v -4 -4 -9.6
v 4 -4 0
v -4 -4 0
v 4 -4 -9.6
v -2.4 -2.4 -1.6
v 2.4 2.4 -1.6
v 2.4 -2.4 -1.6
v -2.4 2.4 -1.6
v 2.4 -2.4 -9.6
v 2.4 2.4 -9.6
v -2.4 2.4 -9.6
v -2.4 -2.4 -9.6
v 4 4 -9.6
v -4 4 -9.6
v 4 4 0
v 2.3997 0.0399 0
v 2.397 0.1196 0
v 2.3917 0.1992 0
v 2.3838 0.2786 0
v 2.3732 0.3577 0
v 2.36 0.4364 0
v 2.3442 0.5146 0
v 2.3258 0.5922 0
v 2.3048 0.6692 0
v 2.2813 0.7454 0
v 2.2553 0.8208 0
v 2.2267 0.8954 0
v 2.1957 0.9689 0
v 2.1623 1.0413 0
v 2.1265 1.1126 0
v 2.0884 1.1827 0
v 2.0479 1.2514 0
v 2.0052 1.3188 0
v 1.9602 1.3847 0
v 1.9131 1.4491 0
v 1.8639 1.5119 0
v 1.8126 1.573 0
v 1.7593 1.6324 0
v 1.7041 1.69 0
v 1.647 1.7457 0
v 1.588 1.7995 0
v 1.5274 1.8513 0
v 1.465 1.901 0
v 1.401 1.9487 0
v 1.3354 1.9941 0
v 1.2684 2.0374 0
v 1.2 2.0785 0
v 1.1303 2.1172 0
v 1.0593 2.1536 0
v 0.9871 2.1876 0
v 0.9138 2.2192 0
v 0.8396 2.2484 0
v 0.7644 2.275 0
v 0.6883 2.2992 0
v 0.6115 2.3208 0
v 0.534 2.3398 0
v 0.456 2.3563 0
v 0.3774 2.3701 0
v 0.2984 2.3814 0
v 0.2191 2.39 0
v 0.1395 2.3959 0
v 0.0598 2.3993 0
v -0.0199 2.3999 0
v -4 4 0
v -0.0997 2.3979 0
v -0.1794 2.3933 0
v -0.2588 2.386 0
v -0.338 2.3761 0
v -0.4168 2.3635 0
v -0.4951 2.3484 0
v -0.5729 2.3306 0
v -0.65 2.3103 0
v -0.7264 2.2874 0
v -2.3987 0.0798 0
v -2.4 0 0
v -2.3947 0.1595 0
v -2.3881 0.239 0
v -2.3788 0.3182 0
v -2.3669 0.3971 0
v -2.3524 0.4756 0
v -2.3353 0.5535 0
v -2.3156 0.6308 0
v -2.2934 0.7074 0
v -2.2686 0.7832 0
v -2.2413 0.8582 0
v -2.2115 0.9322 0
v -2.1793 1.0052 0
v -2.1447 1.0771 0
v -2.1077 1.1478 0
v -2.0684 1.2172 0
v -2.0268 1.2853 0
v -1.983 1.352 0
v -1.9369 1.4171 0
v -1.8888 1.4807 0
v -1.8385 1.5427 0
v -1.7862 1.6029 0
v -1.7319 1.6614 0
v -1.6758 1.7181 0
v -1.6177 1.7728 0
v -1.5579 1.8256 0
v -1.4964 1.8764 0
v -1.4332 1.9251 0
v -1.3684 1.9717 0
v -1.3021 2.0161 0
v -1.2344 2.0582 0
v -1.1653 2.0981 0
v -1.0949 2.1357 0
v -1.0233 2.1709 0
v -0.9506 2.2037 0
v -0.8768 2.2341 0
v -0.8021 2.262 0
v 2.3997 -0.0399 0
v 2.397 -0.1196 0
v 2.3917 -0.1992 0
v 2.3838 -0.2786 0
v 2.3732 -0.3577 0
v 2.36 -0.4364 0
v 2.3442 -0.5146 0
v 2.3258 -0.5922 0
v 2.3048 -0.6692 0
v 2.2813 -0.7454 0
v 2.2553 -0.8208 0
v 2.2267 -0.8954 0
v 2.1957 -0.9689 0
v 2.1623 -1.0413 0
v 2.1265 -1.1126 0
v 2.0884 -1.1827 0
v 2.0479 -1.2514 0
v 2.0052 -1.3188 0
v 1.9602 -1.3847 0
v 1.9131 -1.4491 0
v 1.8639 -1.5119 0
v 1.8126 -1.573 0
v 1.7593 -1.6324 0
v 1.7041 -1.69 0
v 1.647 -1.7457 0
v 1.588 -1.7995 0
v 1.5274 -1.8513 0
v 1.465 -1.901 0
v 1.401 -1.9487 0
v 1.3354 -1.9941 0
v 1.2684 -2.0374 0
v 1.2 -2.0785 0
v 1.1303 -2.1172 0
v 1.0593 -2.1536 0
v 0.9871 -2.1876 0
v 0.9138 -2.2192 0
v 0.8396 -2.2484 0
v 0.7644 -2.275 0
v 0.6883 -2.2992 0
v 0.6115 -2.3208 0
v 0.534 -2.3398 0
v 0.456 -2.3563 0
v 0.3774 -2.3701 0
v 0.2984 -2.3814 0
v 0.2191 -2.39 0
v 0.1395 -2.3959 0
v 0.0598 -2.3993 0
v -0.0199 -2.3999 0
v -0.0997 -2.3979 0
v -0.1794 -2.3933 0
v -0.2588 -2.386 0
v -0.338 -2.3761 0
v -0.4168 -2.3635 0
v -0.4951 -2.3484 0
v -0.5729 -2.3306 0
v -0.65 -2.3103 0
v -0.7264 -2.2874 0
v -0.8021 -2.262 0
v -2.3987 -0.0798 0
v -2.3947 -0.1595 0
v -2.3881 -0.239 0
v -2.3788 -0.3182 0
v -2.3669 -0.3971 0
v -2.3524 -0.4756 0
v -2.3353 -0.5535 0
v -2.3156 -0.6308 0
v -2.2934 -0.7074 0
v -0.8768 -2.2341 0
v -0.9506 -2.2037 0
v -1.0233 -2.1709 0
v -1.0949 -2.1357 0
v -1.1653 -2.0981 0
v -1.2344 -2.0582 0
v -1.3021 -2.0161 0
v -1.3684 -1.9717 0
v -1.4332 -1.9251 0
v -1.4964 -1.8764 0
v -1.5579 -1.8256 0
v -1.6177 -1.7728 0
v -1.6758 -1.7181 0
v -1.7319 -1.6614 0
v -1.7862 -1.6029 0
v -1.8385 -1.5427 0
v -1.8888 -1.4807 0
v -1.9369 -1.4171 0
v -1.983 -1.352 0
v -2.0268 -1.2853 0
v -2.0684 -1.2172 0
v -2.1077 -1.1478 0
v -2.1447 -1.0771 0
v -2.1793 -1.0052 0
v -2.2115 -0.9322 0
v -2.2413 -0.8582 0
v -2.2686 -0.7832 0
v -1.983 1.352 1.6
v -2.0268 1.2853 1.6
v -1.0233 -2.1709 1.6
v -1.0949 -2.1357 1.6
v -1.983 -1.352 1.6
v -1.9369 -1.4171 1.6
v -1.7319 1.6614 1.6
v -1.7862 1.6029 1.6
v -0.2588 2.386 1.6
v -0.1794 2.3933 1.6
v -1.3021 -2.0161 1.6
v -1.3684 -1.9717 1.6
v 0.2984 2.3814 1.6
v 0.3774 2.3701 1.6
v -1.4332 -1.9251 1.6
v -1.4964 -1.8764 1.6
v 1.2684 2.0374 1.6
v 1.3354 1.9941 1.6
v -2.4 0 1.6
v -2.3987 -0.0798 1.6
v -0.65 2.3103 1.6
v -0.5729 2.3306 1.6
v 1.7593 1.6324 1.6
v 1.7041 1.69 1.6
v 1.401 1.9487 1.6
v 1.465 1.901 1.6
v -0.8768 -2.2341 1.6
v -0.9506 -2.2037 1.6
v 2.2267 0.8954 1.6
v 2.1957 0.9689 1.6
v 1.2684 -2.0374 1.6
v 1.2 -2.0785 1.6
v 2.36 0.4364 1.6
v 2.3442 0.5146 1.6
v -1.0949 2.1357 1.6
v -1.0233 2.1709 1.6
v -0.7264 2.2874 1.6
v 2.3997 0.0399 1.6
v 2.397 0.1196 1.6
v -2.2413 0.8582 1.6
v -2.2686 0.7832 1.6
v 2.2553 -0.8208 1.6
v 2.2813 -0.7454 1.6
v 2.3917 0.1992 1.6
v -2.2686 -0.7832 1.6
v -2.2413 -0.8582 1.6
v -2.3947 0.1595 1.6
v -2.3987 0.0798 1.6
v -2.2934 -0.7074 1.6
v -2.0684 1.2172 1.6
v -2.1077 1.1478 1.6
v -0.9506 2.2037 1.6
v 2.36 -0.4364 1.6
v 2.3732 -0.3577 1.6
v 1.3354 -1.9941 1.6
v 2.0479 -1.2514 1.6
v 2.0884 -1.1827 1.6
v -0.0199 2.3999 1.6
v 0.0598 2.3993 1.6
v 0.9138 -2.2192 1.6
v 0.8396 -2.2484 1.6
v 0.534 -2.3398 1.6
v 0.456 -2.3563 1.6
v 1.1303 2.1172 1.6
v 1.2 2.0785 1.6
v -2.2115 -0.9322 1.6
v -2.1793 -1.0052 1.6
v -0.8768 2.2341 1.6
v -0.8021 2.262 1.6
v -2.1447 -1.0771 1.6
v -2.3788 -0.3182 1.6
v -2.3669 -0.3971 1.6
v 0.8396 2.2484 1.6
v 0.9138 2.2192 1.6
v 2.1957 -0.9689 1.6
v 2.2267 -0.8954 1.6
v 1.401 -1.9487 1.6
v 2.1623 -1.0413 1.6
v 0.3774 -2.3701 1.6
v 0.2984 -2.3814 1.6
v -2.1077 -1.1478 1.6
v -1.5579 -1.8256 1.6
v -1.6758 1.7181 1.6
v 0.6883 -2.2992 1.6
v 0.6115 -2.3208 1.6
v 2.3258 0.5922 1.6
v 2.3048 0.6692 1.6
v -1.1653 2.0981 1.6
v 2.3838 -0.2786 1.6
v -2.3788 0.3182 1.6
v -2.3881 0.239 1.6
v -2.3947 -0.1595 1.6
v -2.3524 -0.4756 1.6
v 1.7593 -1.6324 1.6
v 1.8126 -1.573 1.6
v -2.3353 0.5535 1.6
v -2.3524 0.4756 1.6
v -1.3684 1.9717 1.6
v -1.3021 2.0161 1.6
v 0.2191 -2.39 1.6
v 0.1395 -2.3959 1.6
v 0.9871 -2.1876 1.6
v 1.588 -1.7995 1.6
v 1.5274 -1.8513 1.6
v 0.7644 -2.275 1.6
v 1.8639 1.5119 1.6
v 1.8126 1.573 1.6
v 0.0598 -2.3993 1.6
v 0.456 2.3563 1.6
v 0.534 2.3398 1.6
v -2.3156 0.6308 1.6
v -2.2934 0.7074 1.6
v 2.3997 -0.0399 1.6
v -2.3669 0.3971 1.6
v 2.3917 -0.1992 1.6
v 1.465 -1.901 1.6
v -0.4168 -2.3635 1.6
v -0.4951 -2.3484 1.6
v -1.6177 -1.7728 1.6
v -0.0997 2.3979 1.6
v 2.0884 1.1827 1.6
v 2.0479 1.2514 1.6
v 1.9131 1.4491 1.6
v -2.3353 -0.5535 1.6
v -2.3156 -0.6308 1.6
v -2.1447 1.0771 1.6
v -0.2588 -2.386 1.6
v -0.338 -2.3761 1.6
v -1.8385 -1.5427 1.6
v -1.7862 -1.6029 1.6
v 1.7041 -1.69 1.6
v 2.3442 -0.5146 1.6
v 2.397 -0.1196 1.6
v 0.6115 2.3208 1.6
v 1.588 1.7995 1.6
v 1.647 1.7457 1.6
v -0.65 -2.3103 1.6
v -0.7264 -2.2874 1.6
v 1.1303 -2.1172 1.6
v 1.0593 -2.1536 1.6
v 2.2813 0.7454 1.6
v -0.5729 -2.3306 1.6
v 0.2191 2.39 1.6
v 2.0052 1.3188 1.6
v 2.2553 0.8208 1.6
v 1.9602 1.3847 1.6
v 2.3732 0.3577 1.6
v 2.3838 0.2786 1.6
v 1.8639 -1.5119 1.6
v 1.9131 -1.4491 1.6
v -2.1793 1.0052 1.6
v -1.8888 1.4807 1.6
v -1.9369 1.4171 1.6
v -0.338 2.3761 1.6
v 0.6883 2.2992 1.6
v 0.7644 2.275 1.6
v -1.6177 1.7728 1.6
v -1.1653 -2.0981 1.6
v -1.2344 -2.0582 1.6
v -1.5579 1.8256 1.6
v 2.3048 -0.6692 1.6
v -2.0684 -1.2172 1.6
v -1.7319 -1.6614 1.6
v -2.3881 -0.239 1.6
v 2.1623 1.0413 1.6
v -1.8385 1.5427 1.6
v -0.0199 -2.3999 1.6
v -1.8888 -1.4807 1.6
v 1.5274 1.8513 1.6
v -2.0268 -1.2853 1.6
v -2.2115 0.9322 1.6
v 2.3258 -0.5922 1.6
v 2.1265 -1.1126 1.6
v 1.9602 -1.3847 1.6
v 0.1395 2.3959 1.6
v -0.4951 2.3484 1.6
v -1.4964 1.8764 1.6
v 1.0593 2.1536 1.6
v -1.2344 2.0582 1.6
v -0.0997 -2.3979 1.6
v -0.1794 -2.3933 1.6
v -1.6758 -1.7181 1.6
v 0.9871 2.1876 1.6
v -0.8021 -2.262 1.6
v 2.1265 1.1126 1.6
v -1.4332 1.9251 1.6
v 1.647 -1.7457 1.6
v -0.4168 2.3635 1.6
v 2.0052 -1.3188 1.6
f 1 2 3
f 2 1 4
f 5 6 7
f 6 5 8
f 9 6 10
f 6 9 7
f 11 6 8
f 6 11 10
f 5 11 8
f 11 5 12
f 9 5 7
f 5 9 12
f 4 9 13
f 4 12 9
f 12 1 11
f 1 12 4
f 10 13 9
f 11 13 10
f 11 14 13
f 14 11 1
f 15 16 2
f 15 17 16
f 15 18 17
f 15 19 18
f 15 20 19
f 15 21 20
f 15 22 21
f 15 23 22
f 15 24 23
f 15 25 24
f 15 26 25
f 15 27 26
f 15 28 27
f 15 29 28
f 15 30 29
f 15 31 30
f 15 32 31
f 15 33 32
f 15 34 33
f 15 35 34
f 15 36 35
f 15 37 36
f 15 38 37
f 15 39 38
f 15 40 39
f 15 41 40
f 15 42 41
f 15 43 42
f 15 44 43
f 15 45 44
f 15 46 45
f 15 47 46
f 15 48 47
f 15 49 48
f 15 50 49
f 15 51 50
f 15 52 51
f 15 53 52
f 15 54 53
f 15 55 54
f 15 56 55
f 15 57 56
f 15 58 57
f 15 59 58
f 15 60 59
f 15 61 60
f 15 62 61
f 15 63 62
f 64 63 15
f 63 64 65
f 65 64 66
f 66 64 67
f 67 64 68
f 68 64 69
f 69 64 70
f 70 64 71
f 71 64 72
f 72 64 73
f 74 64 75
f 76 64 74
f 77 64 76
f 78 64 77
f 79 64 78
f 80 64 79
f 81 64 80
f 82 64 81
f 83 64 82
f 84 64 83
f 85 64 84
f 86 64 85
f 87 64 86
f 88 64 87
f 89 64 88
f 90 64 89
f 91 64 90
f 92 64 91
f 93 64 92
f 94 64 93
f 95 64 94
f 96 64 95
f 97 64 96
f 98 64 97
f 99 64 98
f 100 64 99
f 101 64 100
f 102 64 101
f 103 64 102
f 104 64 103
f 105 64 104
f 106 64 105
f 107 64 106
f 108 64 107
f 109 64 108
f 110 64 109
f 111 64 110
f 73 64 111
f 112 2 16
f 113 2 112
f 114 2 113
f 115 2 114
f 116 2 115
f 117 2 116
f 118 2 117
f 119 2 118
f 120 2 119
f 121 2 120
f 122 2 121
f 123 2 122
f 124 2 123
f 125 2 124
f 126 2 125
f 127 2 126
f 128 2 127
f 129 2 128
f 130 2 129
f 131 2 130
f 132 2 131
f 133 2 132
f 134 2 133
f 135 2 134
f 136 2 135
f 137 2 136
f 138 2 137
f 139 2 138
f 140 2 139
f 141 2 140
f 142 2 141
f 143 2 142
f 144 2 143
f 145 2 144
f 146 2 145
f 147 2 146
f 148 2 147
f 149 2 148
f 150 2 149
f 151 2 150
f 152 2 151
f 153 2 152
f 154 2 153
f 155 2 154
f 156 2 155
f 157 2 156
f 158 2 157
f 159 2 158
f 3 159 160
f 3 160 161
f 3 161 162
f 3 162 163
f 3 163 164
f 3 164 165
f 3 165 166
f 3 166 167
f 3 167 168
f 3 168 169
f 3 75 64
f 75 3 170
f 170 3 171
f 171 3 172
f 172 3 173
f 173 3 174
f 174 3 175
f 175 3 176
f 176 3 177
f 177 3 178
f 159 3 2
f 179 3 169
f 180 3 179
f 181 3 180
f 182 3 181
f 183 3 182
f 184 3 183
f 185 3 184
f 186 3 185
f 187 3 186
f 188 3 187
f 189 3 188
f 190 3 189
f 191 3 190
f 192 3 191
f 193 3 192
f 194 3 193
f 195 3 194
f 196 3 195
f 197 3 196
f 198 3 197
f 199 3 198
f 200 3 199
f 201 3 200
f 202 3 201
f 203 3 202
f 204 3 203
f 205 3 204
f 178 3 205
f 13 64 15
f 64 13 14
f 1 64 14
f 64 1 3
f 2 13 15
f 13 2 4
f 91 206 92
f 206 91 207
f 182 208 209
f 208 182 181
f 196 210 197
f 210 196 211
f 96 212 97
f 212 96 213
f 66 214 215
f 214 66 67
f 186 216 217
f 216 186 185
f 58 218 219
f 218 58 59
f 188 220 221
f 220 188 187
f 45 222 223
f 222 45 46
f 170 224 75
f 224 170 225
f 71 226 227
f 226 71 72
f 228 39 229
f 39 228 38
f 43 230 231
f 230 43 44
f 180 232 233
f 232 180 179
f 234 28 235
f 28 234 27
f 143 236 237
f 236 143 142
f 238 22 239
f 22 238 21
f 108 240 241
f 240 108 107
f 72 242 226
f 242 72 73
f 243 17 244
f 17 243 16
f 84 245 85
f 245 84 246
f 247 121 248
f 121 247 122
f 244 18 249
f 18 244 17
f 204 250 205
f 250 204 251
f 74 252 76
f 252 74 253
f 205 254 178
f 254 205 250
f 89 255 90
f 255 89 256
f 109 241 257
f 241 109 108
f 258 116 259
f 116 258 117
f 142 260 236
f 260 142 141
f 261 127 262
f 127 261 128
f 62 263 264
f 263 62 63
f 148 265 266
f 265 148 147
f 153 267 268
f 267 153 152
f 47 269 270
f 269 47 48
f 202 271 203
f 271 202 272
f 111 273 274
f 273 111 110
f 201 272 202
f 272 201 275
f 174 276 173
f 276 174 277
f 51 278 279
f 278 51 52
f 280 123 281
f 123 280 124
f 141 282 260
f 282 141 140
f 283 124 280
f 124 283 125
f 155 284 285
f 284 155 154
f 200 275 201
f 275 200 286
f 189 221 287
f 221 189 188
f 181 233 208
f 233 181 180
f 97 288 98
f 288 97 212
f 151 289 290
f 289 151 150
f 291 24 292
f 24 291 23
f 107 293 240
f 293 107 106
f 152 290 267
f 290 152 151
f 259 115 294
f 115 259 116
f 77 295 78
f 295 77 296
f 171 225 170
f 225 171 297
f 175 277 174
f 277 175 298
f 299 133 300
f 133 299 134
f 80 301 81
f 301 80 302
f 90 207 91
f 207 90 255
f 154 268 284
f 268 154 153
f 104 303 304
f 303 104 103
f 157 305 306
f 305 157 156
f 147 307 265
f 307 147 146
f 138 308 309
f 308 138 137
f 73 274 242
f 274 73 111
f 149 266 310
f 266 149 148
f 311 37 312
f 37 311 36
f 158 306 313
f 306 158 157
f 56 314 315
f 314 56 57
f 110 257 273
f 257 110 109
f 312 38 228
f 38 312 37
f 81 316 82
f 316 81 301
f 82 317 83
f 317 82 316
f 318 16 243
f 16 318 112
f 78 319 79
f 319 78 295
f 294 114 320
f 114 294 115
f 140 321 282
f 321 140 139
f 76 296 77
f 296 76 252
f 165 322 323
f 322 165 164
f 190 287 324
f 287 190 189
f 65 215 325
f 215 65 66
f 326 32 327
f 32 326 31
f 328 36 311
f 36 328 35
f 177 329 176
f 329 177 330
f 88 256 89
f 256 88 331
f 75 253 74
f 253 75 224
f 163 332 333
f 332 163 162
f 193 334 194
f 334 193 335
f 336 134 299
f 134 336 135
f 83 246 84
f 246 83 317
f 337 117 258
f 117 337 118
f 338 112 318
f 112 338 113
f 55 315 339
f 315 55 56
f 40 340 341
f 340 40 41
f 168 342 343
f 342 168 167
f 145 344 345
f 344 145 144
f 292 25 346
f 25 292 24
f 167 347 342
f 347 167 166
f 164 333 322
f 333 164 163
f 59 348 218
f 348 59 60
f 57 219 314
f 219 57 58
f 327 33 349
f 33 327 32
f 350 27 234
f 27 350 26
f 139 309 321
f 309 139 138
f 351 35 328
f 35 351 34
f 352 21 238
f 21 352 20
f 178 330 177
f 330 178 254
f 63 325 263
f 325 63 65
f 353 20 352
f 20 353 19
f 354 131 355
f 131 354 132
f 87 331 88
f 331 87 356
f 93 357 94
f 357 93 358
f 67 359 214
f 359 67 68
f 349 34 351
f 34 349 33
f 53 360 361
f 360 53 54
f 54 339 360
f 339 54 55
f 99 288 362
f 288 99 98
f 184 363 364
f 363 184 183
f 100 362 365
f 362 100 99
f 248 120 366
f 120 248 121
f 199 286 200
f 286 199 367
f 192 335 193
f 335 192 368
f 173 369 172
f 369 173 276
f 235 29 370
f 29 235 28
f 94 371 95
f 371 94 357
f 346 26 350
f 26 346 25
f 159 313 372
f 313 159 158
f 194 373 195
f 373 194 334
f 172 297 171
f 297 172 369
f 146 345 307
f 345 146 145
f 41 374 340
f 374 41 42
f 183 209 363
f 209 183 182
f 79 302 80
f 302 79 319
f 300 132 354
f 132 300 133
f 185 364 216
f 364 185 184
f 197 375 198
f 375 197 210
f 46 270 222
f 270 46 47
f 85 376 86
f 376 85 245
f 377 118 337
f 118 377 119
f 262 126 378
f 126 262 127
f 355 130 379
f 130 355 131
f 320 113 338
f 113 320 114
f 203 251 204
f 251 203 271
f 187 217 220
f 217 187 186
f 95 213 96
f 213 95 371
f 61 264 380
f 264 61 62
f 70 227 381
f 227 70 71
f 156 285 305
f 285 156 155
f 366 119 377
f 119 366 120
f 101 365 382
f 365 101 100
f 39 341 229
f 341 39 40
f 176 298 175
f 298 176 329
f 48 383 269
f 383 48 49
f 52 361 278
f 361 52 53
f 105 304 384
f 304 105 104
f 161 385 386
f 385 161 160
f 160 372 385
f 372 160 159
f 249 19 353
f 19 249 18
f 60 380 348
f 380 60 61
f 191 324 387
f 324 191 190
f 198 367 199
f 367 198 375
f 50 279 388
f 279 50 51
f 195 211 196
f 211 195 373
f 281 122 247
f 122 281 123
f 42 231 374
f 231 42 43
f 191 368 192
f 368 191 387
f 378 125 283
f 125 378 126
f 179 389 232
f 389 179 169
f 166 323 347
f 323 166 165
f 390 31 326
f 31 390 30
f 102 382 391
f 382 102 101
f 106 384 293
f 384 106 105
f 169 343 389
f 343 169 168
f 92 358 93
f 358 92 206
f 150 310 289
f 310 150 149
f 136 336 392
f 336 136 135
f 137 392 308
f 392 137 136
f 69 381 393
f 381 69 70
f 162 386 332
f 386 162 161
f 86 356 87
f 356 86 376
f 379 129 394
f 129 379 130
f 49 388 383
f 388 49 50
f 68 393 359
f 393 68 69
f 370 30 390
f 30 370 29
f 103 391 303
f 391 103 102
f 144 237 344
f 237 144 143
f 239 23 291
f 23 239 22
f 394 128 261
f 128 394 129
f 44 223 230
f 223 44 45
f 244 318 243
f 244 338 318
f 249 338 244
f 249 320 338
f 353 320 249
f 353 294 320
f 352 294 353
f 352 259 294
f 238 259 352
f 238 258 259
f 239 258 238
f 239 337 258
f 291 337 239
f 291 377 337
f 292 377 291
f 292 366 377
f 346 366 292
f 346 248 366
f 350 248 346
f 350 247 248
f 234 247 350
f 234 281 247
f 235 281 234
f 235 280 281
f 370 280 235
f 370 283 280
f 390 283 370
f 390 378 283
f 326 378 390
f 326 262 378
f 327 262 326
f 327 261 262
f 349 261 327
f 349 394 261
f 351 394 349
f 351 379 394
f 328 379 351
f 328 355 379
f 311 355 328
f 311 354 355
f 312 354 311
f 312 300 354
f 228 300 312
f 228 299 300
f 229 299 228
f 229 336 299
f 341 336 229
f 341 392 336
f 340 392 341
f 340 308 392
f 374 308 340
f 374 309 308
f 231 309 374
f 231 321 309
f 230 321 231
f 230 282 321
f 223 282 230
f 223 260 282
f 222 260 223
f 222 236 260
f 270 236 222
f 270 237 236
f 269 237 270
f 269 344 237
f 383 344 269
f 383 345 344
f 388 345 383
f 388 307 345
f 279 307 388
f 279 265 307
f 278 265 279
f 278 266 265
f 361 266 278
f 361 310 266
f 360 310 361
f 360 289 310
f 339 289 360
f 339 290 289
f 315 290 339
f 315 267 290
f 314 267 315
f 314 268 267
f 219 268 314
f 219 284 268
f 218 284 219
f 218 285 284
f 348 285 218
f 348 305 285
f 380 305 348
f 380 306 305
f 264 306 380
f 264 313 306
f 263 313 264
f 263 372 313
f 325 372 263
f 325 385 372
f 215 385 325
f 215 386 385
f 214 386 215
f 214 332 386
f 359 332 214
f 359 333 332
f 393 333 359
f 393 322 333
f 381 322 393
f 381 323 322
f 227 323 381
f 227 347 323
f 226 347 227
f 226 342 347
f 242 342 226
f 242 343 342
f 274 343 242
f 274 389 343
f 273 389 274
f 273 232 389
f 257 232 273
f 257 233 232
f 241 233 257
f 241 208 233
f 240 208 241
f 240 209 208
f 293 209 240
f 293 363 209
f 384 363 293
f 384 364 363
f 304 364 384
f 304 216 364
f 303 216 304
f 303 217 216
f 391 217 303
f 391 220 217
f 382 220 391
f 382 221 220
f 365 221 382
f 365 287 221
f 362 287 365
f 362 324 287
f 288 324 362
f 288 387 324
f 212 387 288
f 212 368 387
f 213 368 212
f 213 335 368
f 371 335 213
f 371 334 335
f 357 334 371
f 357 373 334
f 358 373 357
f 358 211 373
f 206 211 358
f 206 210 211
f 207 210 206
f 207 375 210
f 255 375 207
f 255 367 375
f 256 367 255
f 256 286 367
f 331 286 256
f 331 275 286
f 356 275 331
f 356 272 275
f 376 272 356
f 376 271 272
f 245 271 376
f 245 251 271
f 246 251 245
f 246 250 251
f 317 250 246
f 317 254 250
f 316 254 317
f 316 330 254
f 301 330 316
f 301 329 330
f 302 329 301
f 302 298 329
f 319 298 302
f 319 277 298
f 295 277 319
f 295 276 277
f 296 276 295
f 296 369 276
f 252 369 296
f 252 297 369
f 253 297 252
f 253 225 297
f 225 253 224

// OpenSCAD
// file: ../p/4-4edge.scad
use <../lib.scad>
$fa=1; $fs=0.2;
function ldraw_lib__4_4edge(realsolid=false) = [
// 0 Circle 1.0
// 0 Name: 4-4edge.dat
// 0 Author: James Jessiman
// 0 !LDRAW_ORG Primitive UPDATE 2017-01
// 0 !LICENSE Licensed under CC BY 2.0 and CC BY 4.0 : see CAreadme.txt
// 
// 0 BFC CERTIFY CCW
  [0,"BFC","CERTIFY"],
  [0,"BFC","CCW"],
// 
// 0 !HISTORY 1998-12-15 [PTadmin] Official Update 1998-10
// 0 !HISTORY 2005-12-28 [PTadmin] Official Update 2005-01
// 0 !HISTORY 2007-06-24 [PTadmin] Header formatted for Contributor Agreement
// 0 !HISTORY 2008-07-01 [PTadmin] Official Update 2008-01
// 0 !HISTORY 2017-01-15 [Steffen] BFCed
// 0 !HISTORY 2017-12-30 [PTadmin] Official Update 2017-01
// 
// 
// 2 24 1 0 0 0.9239 0 0.3827
  [2,24,1,0,0,0.9239,0,0.3827],
// 2 24 0.9239 0 0.3827 0.7071 0 0.7071
  [2,24,0.9239,0,0.3827,0.7071,0,0.7071],
// 2 24 0.7071 0 0.7071 0.3827 0 0.9239
  [2,24,0.7071,0,0.7071,0.3827,0,0.9239],
// 2 24 0.3827 0 0.9239 0 0 1
  [2,24,0.3827,0,0.9239,0,0,1],
// 2 24 0 0 1 -0.3827 0 0.9239
  [2,24,0,0,1,-0.3827,0,0.9239],
// 2 24 -0.3827 0 0.9239 -0.7071 0 0.7071
  [2,24,-0.3827,0,0.9239,-0.7071,0,0.7071],
// 2 24 -0.7071 0 0.7071 -0.9239 0 0.3827
  [2,24,-0.7071,0,0.7071,-0.9239,0,0.3827],
// 2 24 -0.9239 0 0.3827 -1 0 -0
  [2,24,-0.9239,0,0.3827,-1,0,-0],
// 2 24 -1 0 -0 -0.9239 0 -0.3827
  [2,24,-1,0,-0,-0.9239,0,-0.3827],
// 2 24 -0.9239 0 -0.3827 -0.7071 0 -0.7071
  [2,24,-0.9239,0,-0.3827,-0.7071,0,-0.7071],
// 2 24 -0.7071 0 -0.7071 -0.3827 0 -0.9239
  [2,24,-0.7071,0,-0.7071,-0.3827,0,-0.9239],
// 2 24 -0.3827 0 -0.9239 0 0 -1
  [2,24,-0.3827,0,-0.9239,0,0,-1],
// 2 24 0 0 -1 0.3827 0 -0.9239
  [2,24,0,0,-1,0.3827,0,-0.9239],
// 2 24 0.3827 0 -0.9239 0.7071 0 -0.7071
  [2,24,0.3827,0,-0.9239,0.7071,0,-0.7071],
// 2 24 0.7071 0 -0.7071 0.9239 0 -0.3827
  [2,24,0.7071,0,-0.7071,0.9239,0,-0.3827],
// 2 24 0.9239 0 -0.3827 1 0 0
  [2,24,0.9239,0,-0.3827,1,0,0],
];
module ldraw_lib__4_4edge(step=0, col=false, unit=2/5, alt=false, line=0.2, solid=!$preview)
    makepoly(ldraw_lib__4_4edge(solid), step=step, col=col, unit=unit, alt=alt, line=line, solid=solid);
ldraw_lib__4_4edge(line=0.2);
// file: ../p/4-4disc.scad
use <../lib.scad>
$fa=1; $fs=0.2;
function ldraw_lib__4_4disc(realsolid=false) = [
// 0 Disc 1.0
// 0 Name: 4-4disc.dat
// 0 Author: James Jessiman
// 0 !LDRAW_ORG Primitive UPDATE 2002-02
// 0 !LICENSE Licensed under CC BY 2.0 and CC BY 4.0 : see CAreadme.txt
// 
// 0 BFC CERTIFY CCW
  [0,"BFC","CERTIFY"],
  [0,"BFC","CCW"],
// 
// 0 !HISTORY 1998-12-15 [PTadmin] Official Update 1998-10
// 0 !HISTORY 2002-03-23 [sbliss] Added BFC statement
// 0 !HISTORY 2002-04-25 [PTadmin] Official Update 2002-02
// 0 !HISTORY 2007-06-24 [PTadmin] Header formatted for Contributor Agreement
// 0 !HISTORY 2008-07-01 [PTadmin] Official Update 2008-01
// 
// 
// 3 16 0 0 0 1 0 0 0.9239 0 0.3827
  [3,16,0,0,0,1,0,0,0.9239,0,0.3827],
// 3 16 0 0 0 0.9239 0 0.3827 0.7071 0 0.7071
  [3,16,0,0,0,0.9239,0,0.3827,0.7071,0,0.7071],
// 3 16 0 0 0 0.7071 0 0.7071 0.3827 0 0.9239
  [3,16,0,0,0,0.7071,0,0.7071,0.3827,0,0.9239],
// 3 16 0 0 0 0.3827 0 0.9239 0 0 1
  [3,16,0,0,0,0.3827,0,0.9239,0,0,1],
// 3 16 0 0 0 0 0 1 -0.3827 0 0.9239
  [3,16,0,0,0,0,0,1,-0.3827,0,0.9239],
// 3 16 0 0 0 -0.3827 0 0.9239 -0.7071 0 0.7071
  [3,16,0,0,0,-0.3827,0,0.9239,-0.7071,0,0.7071],
// 3 16 0 0 0 -0.7071 0 0.7071 -0.9239 0 0.3827
  [3,16,0,0,0,-0.7071,0,0.7071,-0.9239,0,0.3827],
// 3 16 0 0 0 -0.9239 0 0.3827 -1 0 -0
  [3,16,0,0,0,-0.9239,0,0.3827,-1,0,-0],
// 3 16 0 0 0 -1 0 -0 -0.9239 0 -0.3827
  [3,16,0,0,0,-1,0,-0,-0.9239,0,-0.3827],
// 3 16 0 0 0 -0.9239 0 -0.3827 -0.7071 0 -0.7071
  [3,16,0,0,0,-0.9239,0,-0.3827,-0.7071,0,-0.7071],
// 3 16 0 0 0 -0.7071 0 -0.7071 -0.3827 0 -0.9239
  [3,16,0,0,0,-0.7071,0,-0.7071,-0.3827,0,-0.9239],
// 3 16 0 0 0 -0.3827 0 -0.9239 0 0 -1
  [3,16,0,0,0,-0.3827,0,-0.9239,0,0,-1],
// 3 16 0 0 0 0 0 -1 0.3827 0 -0.9239
  [3,16,0,0,0,0,0,-1,0.3827,0,-0.9239],
// 3 16 0 0 0 0.3827 0 -0.9239 0.7071 0 -0.7071
  [3,16,0,0,0,0.3827,0,-0.9239,0.7071,0,-0.7071],
// 3 16 0 0 0 0.7071 0 -0.7071 0.9239 0 -0.3827
  [3,16,0,0,0,0.7071,0,-0.7071,0.9239,0,-0.3827],
// 3 16 0 0 0 0.9239 0 -0.3827 1 0 0
  [3,16,0,0,0,0.9239,0,-0.3827,1,0,0],
// 0
];
module ldraw_lib__4_4disc(step=0, col=false, unit=2/5, alt=false, line=0.2, solid=!$preview)
    makepoly(ldraw_lib__4_4disc(solid), step=step, col=col, unit=unit, alt=alt, line=line, solid=solid);
ldraw_lib__4_4disc(line=0.2);
// file: ../p/4-4cyli.scad
use <../lib.scad>
$fa=1; $fs=0.2;
function ldraw_lib__4_4cyli(realsolid=false) = [
// 0 Cylinder 1.0
// 0 Name: 4-4cyli.dat
// 0 Author: James Jessiman
// 0 !LDRAW_ORG Primitive UPDATE 2005-01
// 0 !LICENSE Licensed under CC BY 2.0 and CC BY 4.0 : see CAreadme.txt
// 
// 0 BFC CERTIFY CCW
  [0,"BFC","CERTIFY"],
  [0,"BFC","CCW"],
// 
// 0 !HISTORY 1998-12-15 [PTadmin] Official Update 1998-10
// 0 !HISTORY 2002-03-23 [sbliss] Added BFC statement; merged headers from files in distributions LDraw 0.27 and Complete.
// 0 !HISTORY 2002-04-25 [PTadmin] Official Update 2002-02
// 0 !HISTORY 2004-12-14 [guyvivan] BFC CCW
// 0 !HISTORY 2005-12-28 [PTadmin] Official Update 2005-01
// 0 !HISTORY 2007-06-24 [PTadmin] Header formatted for Contributor Agreement
// 0 !HISTORY 2008-07-01 [PTadmin] Official Update 2008-01
// 
// 
// 4 16 1 1 0 0.9239 1 0.3827 0.9239 0 0.3827 1 0 0
  [4,16,1,1,0,0.9239,1,0.3827,0.9239,0,0.3827,1,0,0],
// 5 24 1 0 0 1 1 0 0.9239 0 0.3827 0.9239 0 -0.3827
  [5,24,1,0,0,1,1,0,0.9239,0,0.3827,0.9239,0,-0.3827],
// 4 16 0.9239 1 0.3827 0.7071 1 0.7071 0.7071 0 0.7071 0.9239 0 0.3827
  [4,16,0.9239,1,0.3827,0.7071,1,0.7071,0.7071,0,0.7071,0.9239,0,0.3827],
// 5 24 0.9239 0 0.3827 0.9239 1 0.3827 0.7071 0 0.7071 1 0 0
  [5,24,0.9239,0,0.3827,0.9239,1,0.3827,0.7071,0,0.7071,1,0,0],
// 4 16 0.7071 1 0.7071 0.3827 1 0.9239 0.3827 0 0.9239 0.7071 0 0.7071
  [4,16,0.7071,1,0.7071,0.3827,1,0.9239,0.3827,0,0.9239,0.7071,0,0.7071],
// 5 24 0.7071 0 0.7071 0.7071 1 0.7071 0.3827 0 0.9239 0.9239 0 0.3827
  [5,24,0.7071,0,0.7071,0.7071,1,0.7071,0.3827,0,0.9239,0.9239,0,0.3827],
// 4 16 0.3827 1 0.9239 0 1 1 0 0 1 0.3827 0 0.9239
  [4,16,0.3827,1,0.9239,0,1,1,0,0,1,0.3827,0,0.9239],
// 5 24 0.3827 0 0.9239 0.3827 1 0.9239 0 0 1 0.7071 0 0.7071
  [5,24,0.3827,0,0.9239,0.3827,1,0.9239,0,0,1,0.7071,0,0.7071],
// 4 16 0 1 1 -0.3827 1 0.9239 -0.3827 0 0.9239 0 0 1
  [4,16,0,1,1,-0.3827,1,0.9239,-0.3827,0,0.9239,0,0,1],
// 5 24 0 0 1 0 1 1 -0.3827 0 0.9239 0.3827 0 0.9239
  [5,24,0,0,1,0,1,1,-0.3827,0,0.9239,0.3827,0,0.9239],
// 4 16 -0.3827 1 0.9239 -0.7071 1 0.7071 -0.7071 0 0.7071 -0.3827 0 0.9239
  [4,16,-0.3827,1,0.9239,-0.7071,1,0.7071,-0.7071,0,0.7071,-0.3827,0,0.9239],
// 5 24 -0.3827 0 0.9239 -0.3827 1 0.9239 -0.7071 0 0.7071 0 0 1
  [5,24,-0.3827,0,0.9239,-0.3827,1,0.9239,-0.7071,0,0.7071,0,0,1],
// 4 16 -0.7071 1 0.7071 -0.9239 1 0.3827 -0.9239 0 0.3827 -0.7071 0 0.7071
  [4,16,-0.7071,1,0.7071,-0.9239,1,0.3827,-0.9239,0,0.3827,-0.7071,0,0.7071],
// 5 24 -0.7071 0 0.7071 -0.7071 1 0.7071 -0.9239 0 0.3827 -0.3827 0 0.9239
  [5,24,-0.7071,0,0.7071,-0.7071,1,0.7071,-0.9239,0,0.3827,-0.3827,0,0.9239],
// 4 16 -0.9239 1 0.3827 -1 1 0 -1 0 0 -0.9239 0 0.3827
  [4,16,-0.9239,1,0.3827,-1,1,0,-1,0,0,-0.9239,0,0.3827],
// 5 24 -0.9239 0 0.3827 -0.9239 1 0.3827 -1 0 0 -0.7071 0 0.7071
  [5,24,-0.9239,0,0.3827,-0.9239,1,0.3827,-1,0,0,-0.7071,0,0.7071],
// 4 16 -1 1 0 -0.9239 1 -0.3827 -0.9239 0 -0.3827 -1 0 0
  [4,16,-1,1,0,-0.9239,1,-0.3827,-0.9239,0,-0.3827,-1,0,0],
// 5 24 -1 0 0 -1 1 0 -0.9239 0 -0.3827 -0.9239 0 0.3827
  [5,24,-1,0,0,-1,1,0,-0.9239,0,-0.3827,-0.9239,0,0.3827],
// 4 16 -0.9239 1 -0.3827 -0.7071 1 -0.7071 -0.7071 0 -0.7071 -0.9239 0 -0.3827
  [4,16,-0.9239,1,-0.3827,-0.7071,1,-0.7071,-0.7071,0,-0.7071,-0.9239,0,-0.3827],
// 5 24 -0.9239 0 -0.3827 -0.9239 1 -0.3827 -0.7071 0 -0.7071 -1 0 0
  [5,24,-0.9239,0,-0.3827,-0.9239,1,-0.3827,-0.7071,0,-0.7071,-1,0,0],
// 4 16 -0.7071 1 -0.7071 -0.3827 1 -0.9239 -0.3827 0 -0.9239 -0.7071 0 -0.7071
  [4,16,-0.7071,1,-0.7071,-0.3827,1,-0.9239,-0.3827,0,-0.9239,-0.7071,0,-0.7071],
// 5 24 -0.7071 0 -0.7071 -0.7071 1 -0.7071 -0.3827 0 -0.9239 -0.9239 0 -0.3827
  [5,24,-0.7071,0,-0.7071,-0.7071,1,-0.7071,-0.3827,0,-0.9239,-0.9239,0,-0.3827],
// 4 16 -0.3827 1 -0.9239 0 1 -1 0 0 -1 -0.3827 0 -0.9239
  [4,16,-0.3827,1,-0.9239,0,1,-1,0,0,-1,-0.3827,0,-0.9239],
// 5 24 -0.3827 0 -0.9239 -0.3827 1 -0.9239 0 0 -1 -0.7071 0 -0.7071
  [5,24,-0.3827,0,-0.9239,-0.3827,1,-0.9239,0,0,-1,-0.7071,0,-0.7071],
// 4 16 0 1 -1 0.3827 1 -0.9239 0.3827 0 -0.9239 0 0 -1
  [4,16,0,1,-1,0.3827,1,-0.9239,0.3827,0,-0.9239,0,0,-1],
// 5 24 0 0 -1 0 1 -1 0.3827 0 -0.9239 -0.3827 0 -0.9239
  [5,24,0,0,-1,0,1,-1,0.3827,0,-0.9239,-0.3827,0,-0.9239],
// 4 16 0.3827 1 -0.9239 0.7071 1 -0.7071 0.7071 0 -0.7071 0.3827 0 -0.9239
  [4,16,0.3827,1,-0.9239,0.7071,1,-0.7071,0.7071,0,-0.7071,0.3827,0,-0.9239],
// 5 24 0.3827 0 -0.9239 0.3827 1 -0.9239 0.7071 0 -0.7071 0 0 -1
  [5,24,0.3827,0,-0.9239,0.3827,1,-0.9239,0.7071,0,-0.7071,0,0,-1],
// 4 16 0.7071 1 -0.7071 0.9239 1 -0.3827 0.9239 0 -0.3827 0.7071 0 -0.7071
  [4,16,0.7071,1,-0.7071,0.9239,1,-0.3827,0.9239,0,-0.3827,0.7071,0,-0.7071],
// 5 24 0.7071 0 -0.7071 0.7071 1 -0.7071 0.9239 0 -0.3827 0.3827 0 -0.9239
  [5,24,0.7071,0,-0.7071,0.7071,1,-0.7071,0.9239,0,-0.3827,0.3827,0,-0.9239],
// 4 16 0.9239 1 -0.3827 1 1 0 1 0 0 0.9239 0 -0.3827
  [4,16,0.9239,1,-0.3827,1,1,0,1,0,0,0.9239,0,-0.3827],
// 5 24 0.9239 0 -0.3827 0.9239 1 -0.3827 1 0 0 0.7071 0 -0.7071
  [5,24,0.9239,0,-0.3827,0.9239,1,-0.3827,1,0,0,0.7071,0,-0.7071],
// 0
];
module ldraw_lib__4_4cyli(step=0, col=false, unit=2/5, alt=false, line=0.2, solid=!$preview)
    makepoly(ldraw_lib__4_4cyli(solid), step=step, col=col, unit=unit, alt=alt, line=line, solid=solid);
ldraw_lib__4_4cyli(line=0.2);
// file: ../p/stud3.scad
use <../lib.scad>
use <4-4cyli.scad>
use <4-4disc.scad>
use <4-4edge.scad>
$fa=1; $fs=0.2;
function ldraw_lib__stud3(realsolid=false) = realsolid ? 
    [openscad(translate([0,0,-eps()], o=cylinder(4+eps(), r=4)),2)] : [
// 0 Stud Tube Solid
// 0 Name: stud3.dat
// 0 Author: James Jessiman
// 0 !LDRAW_ORG Primitive UPDATE 2012-01
// 0 !LICENSE Licensed under CC BY 2.0 and CC BY 4.0 : see CAreadme.txt
// 
// 0 BFC CERTIFY CCW
  [0,"BFC","CERTIFY"],
  [0,"BFC","CCW"],
// 
// 0 !HISTORY 2002-04-04 [sbliss] Modified for BFC compliance
// 0 !HISTORY 2002-04-25 [PTadmin] Official Update 2002-02
// 0 !HISTORY 2007-06-24 [PTadmin] Header formatted for Contributor Agreement
// 0 !HISTORY 2008-07-01 [PTadmin] Official Update 2008-01
// 0 !HISTORY 2012-02-16 [Philo] Changed to CCW
// 0 !HISTORY 2012-03-30 [PTadmin] Official Update 2012-01
// 
// 
// 1 16 0 -4 0 4 0 0 0 1 0 0 0 4 4-4edge.dat
  [1,16,0,-4,0,4,0,0,0,1,0,0,0,4, ldraw_lib__4_4edge(realsolid)],
// 1 16 0 0 0 4 0 0 0 1 0 0 0 4 4-4edge.dat
  [1,16,0,0,0,4,0,0,0,1,0,0,0,4, ldraw_lib__4_4edge(realsolid)],
// 1 16 0 -4 0 4 0 0 0 1 0 0 0 4 4-4disc.dat
  [1,16,0,-4,0,4,0,0,0,1,0,0,0,4, ldraw_lib__4_4disc(realsolid)],
// 1 16 0 -4 0 4 0 0 0 4 0 0 0 4 4-4cyli.dat
  [1,16,0,-4,0,4,0,0,0,4,0,0,0,4, ldraw_lib__4_4cyli(realsolid)],
];
module ldraw_lib__stud3(step=0, col=false, unit=2/5, alt=false, line=0.2, solid=!$preview)
    makepoly(ldraw_lib__stud3(solid), step=step, col=col, unit=unit, alt=alt, line=line, solid=solid);
ldraw_lib__stud3(line=0.2);
// file: ../p/stud.scad
use <../lib.scad>
use <4-4cyli.scad>
use <4-4disc.scad>
use <4-4edge.scad>
$fa=1; $fs=0.2;
function ldraw_lib__stud(realsolid=false) = realsolid ? 
    [openscad(translate([0,0,-eps()], o=cylinder(4+eps(), r=6)),2)] : [
// 0 Stud
// 0 Name: stud.dat
// 0 Author: James Jessiman
// 0 !LDRAW_ORG Primitive UPDATE 2012-01
// 0 !LICENSE Licensed under CC BY 2.0 and CC BY 4.0 : see CAreadme.txt
// 
// 0 BFC CERTIFY CCW
  [0,"BFC","CERTIFY"],
  [0,"BFC","CCW"],
// 
// 0 !HISTORY 2002-04-04 [sbliss] Modified for BFC compliance
// 0 !HISTORY 2002-04-25 [PTadmin] Official Update 2002-02
// 0 !HISTORY 2007-06-24 [PTadmin] Header formatted for Contributor Agreement
// 0 !HISTORY 2008-07-01 [PTadmin] Official Update 2008-01
// 0 !HISTORY 2012-02-16 [Philo] Changed to CCW
// 0 !HISTORY 2012-03-30 [PTadmin] Official Update 2012-01
// 
// 
// 1 16 0 0 0 6 0 0 0 1 0 0 0 6 4-4edge.dat
  [1,16,0,0,0,6,0,0,0,1,0,0,0,6, ldraw_lib__4_4edge(realsolid)],
// 1 16 0 -4 0 6 0 0 0 1 0 0 0 6 4-4edge.dat
  [1,16,0,-4,0,6,0,0,0,1,0,0,0,6, ldraw_lib__4_4edge(realsolid)],
// 1 16 0 0 0 6 0 0 0 -4 0 0 0 6 4-4cyli.dat
  [1,16,0,0,0,6,0,0,0,-4,0,0,0,6, ldraw_lib__4_4cyli(realsolid)],
// 1 16 0 -4 0 6 0 0 0 1 0 0 0 6 4-4disc.dat
  [1,16,0,-4,0,6,0,0,0,1,0,0,0,6, ldraw_lib__4_4disc(realsolid)],
];
module ldraw_lib__stud(step=0, col=false, unit=2/5, alt=false, line=0.2, solid=!$preview)
    makepoly(ldraw_lib__stud(solid), step=step, col=col, unit=unit, alt=alt, line=line, solid=solid);
ldraw_lib__stud(line=0.2);
// file: ../p/box5.scad
use <../lib.scad>
$fa=1; $fs=0.2;
function ldraw_lib__box5(realsolid=false) = [
// 0 Box with 5 Faces and All Edges
// 0 Name: box5.dat
// 0 Author: James Jessiman
// 0 !LDRAW_ORG Primitive UPDATE 2012-01
// 0 !LICENSE Licensed under CC BY 2.0 and CC BY 4.0 : see CAreadme.txt
// 
// 0 BFC CERTIFY CCW
  [0,"BFC","CERTIFY"],
  [0,"BFC","CCW"],
// 
// 0 !HISTORY 2002-04-03 [sbliss] Modified for BFC compliance
// 0 !HISTORY 2002-04-25 [PTadmin] Official Update 2002-02
// 0 !HISTORY 2007-06-24 [PTadmin] Header formatted for Contributor Agreement
// 0 !HISTORY 2008-07-01 [PTadmin] Official Update 2008-01
// 0 !HISTORY 2012-02-16 [Philo] Changed to CCW
// 0 !HISTORY 2012-03-30 [PTadmin] Official Update 2012-01
// 
// 
// 2 24 1 1 1 -1 1 1
  [2,24,1,1,1,-1,1,1],
// 2 24 -1 1 1 -1 1 -1
  [2,24,-1,1,1,-1,1,-1],
// 2 24 -1 1 -1 1 1 -1
  [2,24,-1,1,-1,1,1,-1],
// 2 24 1 1 -1 1 1 1
  [2,24,1,1,-1,1,1,1],
// 2 24 1 0 1 -1 0 1
  [2,24,1,0,1,-1,0,1],
// 2 24 -1 0 1 -1 0 -1
  [2,24,-1,0,1,-1,0,-1],
// 2 24 -1 0 -1 1 0 -1
  [2,24,-1,0,-1,1,0,-1],
// 2 24 1 0 -1 1 0 1
  [2,24,1,0,-1,1,0,1],
// 2 24 1 0 1 1 1 1
  [2,24,1,0,1,1,1,1],
// 2 24 -1 0 1 -1 1 1
  [2,24,-1,0,1,-1,1,1],
// 2 24 1 0 -1 1 1 -1
  [2,24,1,0,-1,1,1,-1],
// 2 24 -1 0 -1 -1 1 -1
  [2,24,-1,0,-1,-1,1,-1],
// 4 16 -1 1 1 1 1 1 1 1 -1 -1 1 -1
  [4,16,-1,1,1,1,1,1,1,1,-1,-1,1,-1],
// 4 16 -1 1 1 -1 0 1 1 0 1 1 1 1
  [4,16,-1,1,1,-1,0,1,1,0,1,1,1,1],
// 4 16 -1 1 -1 -1 0 -1 -1 0 1 -1 1 1
  [4,16,-1,1,-1,-1,0,-1,-1,0,1,-1,1,1],
// 4 16 1 1 -1 1 0 -1 -1 0 -1 -1 1 -1
  [4,16,1,1,-1,1,0,-1,-1,0,-1,-1,1,-1],
// 4 16 1 1 1 1 0 1 1 0 -1 1 1 -1
  [4,16,1,1,1,1,0,1,1,0,-1,1,1,-1],
];
module ldraw_lib__box5(step=0, col=false, unit=2/5, alt=false, line=0.2, solid=!$preview)
    makepoly(ldraw_lib__box5(solid), step=step, col=col, unit=unit, alt=alt, line=line, solid=solid);
ldraw_lib__box5(line=0.2);
// file: ../p/box4t.scad
use <../lib.scad>
$fa=1; $fs=0.2;
function ldraw_lib__box4t(realsolid=false) = [
// 0 Box with 4 Adjacent Faces and All Edges
// 0 Name: box4t.dat
// 0 Author: Tore Eriksson [Tore_Eriksson]
// 0 !LDRAW_ORG Primitive UPDATE 2003-02
// 0 !LICENSE Licensed under CC BY 2.0 and CC BY 4.0 : see CAreadme.txt
// 
// 0 BFC CERTIFY CCW
  [0,"BFC","CERTIFY"],
  [0,"BFC","CCW"],
// 
// 0 !HISTORY 1997-09-29 [PTadmin] Official Update 1997-15
// 0 !HISTORY 2002-08-31 [izanette] Modified with WINDZ for BFC compliance
// 0 !HISTORY 2003-08-01 [PTadmin] Official Update 2003-02
// 0 !HISTORY 2007-06-24 [PTadmin] Header formatted for Contributor Agreement
// 0 !HISTORY 2008-07-01 [PTadmin] Official Update 2008-01
// 
// 
// 2 24 1 1 1 -1 1 1
  [2,24,1,1,1,-1,1,1],
// 2 24 -1 1 1 -1 1 -1
  [2,24,-1,1,1,-1,1,-1],
// 2 24 -1 1 -1 1 1 -1
  [2,24,-1,1,-1,1,1,-1],
// 2 24 1 1 -1 1 1 1
  [2,24,1,1,-1,1,1,1],
// 2 24 1 0 1 -1 0 1
  [2,24,1,0,1,-1,0,1],
// 2 24 -1 0 1 -1 0 -1
  [2,24,-1,0,1,-1,0,-1],
// 2 24 -1 0 -1 1 0 -1
  [2,24,-1,0,-1,1,0,-1],
// 2 24 1 0 -1 1 0 1
  [2,24,1,0,-1,1,0,1],
// 2 24 1 0 1 1 1 1
  [2,24,1,0,1,1,1,1],
// 2 24 -1 0 1 -1 1 1
  [2,24,-1,0,1,-1,1,1],
// 2 24 1 0 -1 1 1 -1
  [2,24,1,0,-1,1,1,-1],
// 2 24 -1 0 -1 -1 1 -1
  [2,24,-1,0,-1,-1,1,-1],
// 4 16 1 1 1 1 1 -1 -1 1 -1 -1 1 1
  [4,16,1,1,1,1,1,-1,-1,1,-1,-1,1,1],
// 4 16 1 1 1 -1 1 1 -1 0 1 1 0 1
  [4,16,1,1,1,-1,1,1,-1,0,1,1,0,1],
// 4 16 -1 1 1 -1 1 -1 -1 0 -1 -1 0 1
  [4,16,-1,1,1,-1,1,-1,-1,0,-1,-1,0,1],
// 0 4 16 -1 1 -1 -1 0 -1 1 0 -1 1 1 -1
// 4 16 1 1 -1 1 1 1 1 0 1 1 0 -1
  [4,16,1,1,-1,1,1,1,1,0,1,1,0,-1],
// 0
];
module ldraw_lib__box4t(step=0, col=false, unit=2/5, alt=false, line=0.2, solid=!$preview)
    makepoly(ldraw_lib__box4t(solid), step=step, col=col, unit=unit, alt=alt, line=line, solid=solid);
ldraw_lib__box4t(line=0.2);
// file: s/3004s01.scad
use <../../lib.scad>
use <../../p/box4t.scad>
use <../../p/box5.scad>
use <../../p/stud.scad>
use <../../p/stud3.scad>
$fa=1; $fs=0.2;
function ldraw_lib__s__3004s01(realsolid=false) = [
// 0 ~Brick  1 x  2 without Front Face
// 0 Name: s\3004s01.dat
// 0 Author: James Jessiman
// 0 !LDRAW_ORG Subpart UPDATE 2003-03
// 0 !LICENSE Licensed under CC BY 2.0 and CC BY 4.0 : see CAreadme.txt
// 
// 0 BFC CERTIFY CCW
  [0,"BFC","CERTIFY"],
  [0,"BFC","CCW"],
// 
// 0 !HISTORY 2003-09-07 [jriley] Subfiling, BFC
// 0 !HISTORY 2003-12-19 [PTadmin] Official Update 2003-03
// 0 !HISTORY 2007-08-29 [PTadmin] Header formatted for Contributor Agreement
// 0 !HISTORY 2008-07-01 [PTadmin] Official Update 2008-01
// 
// 
// 1 16 0 4 0 1 0 0 0 -5 0 0 0 1 stud3.dat
  [1,16,0,4,0,1,0,0,0,-5,0,0,0,1, ldraw_lib__stud3(realsolid)],
// 0 BFC INVERTNEXT
  [0,"BFC","INVERTNEXT"],
// 1 16 0 24 0 16 0 0 0 -20 0 0 0 6 box5.dat
  [1,16,0,24,0,16,0,0,0,-20,0,0,0,6, ldraw_lib__box5(realsolid)],
// 4 16 20 24 10 16 24 6 -16 24 6 -20 24 10
  [4,16,20,24,10,16,24,6,-16,24,6,-20,24,10],
// 4 16 -20 24 10 -16 24 6 -16 24 -6 -20 24 -10
  [4,16,-20,24,10,-16,24,6,-16,24,-6,-20,24,-10],
// 4 16 -20 24 -10 -16 24 -6 16 24 -6 20 24 -10
  [4,16,-20,24,-10,-16,24,-6,16,24,-6,20,24,-10],
// 4 16 20 24 -10 16 24 -6 16 24 6 20 24 10
  [4,16,20,24,-10,16,24,-6,16,24,6,20,24,10],
// 1 16 0 24 0 20 0 0 0 -24 0 0 0 10 box4t.dat
  [1,16,0,24,0,20,0,0,0,-24,0,0,0,10, ldraw_lib__box4t(realsolid)],
// 1 16 10 0 0 1 0 0 0 1 0 0 0 1 stud.dat
  [1,16,10,0,0,1,0,0,0,1,0,0,0,1, ldraw_lib__stud(realsolid)],
// 1 16 -10 0 0 1 0 0 0 1 0 0 0 1 stud.dat
  [1,16,-10,0,0,1,0,0,0,1,0,0,0,1, ldraw_lib__stud(realsolid)],
// 0
];
module ldraw_lib__s__3004s01(step=0, col=false, unit=2/5, alt=false, line=0.2, solid=!$preview)
    makepoly(ldraw_lib__s__3004s01(solid), step=step, col=col, unit=unit, alt=alt, line=line, solid=solid);
ldraw_lib__s__3004s01(line=0.2);
// file: s/3005s01.scad
use <../../lib.scad>
use <../../p/box4t.scad>
use <../../p/box5.scad>
use <../../p/stud.scad>
$fa=1; $fs=0.2;
function ldraw_lib__s__3005s01(realsolid=false) = [
// 0 ~Brick  1 x  1 without Front Face
// 0 Name: s\3005s01.dat
// 0 Author: John Riley [jriley]
// 0 !LDRAW_ORG Subpart UPDATE 2004-01
// 0 !LICENSE Licensed under CC BY 2.0 and CC BY 4.0 : see CAreadme.txt
// 
// 0 BFC CERTIFY CCW
  [0,"BFC","CERTIFY"],
  [0,"BFC","CCW"],
// 
// 0 !HISTORY 2003-09-07 [jriley] BFCed & Subfiled
// 0 !HISTORY 2004-03-02 [PTadmin] Official Update 2004-01
// 0 !HISTORY 2007-08-29 [PTadmin] Header formatted for Contributor Agreement
// 0 !HISTORY 2008-07-01 [PTadmin] Official Update 2008-01
// 
// 
// 0 BFC INVERTNEXT
  [0,"BFC","INVERTNEXT"],
// 1 16 0 24 0 0 0 6 0 -20 0 -6 0 0 box5.dat
  [1,16,0,24,0,0,0,6,0,-20,0,-6,0,0, ldraw_lib__box5(realsolid)],
// 4 16 10 24 -10 6 24 -6 6 24 6 10 24 10
  [4,16,10,24,-10,6,24,-6,6,24,6,10,24,10],
// 4 16 10 24 10 6 24 6 -6 24 6 -10 24 10
  [4,16,10,24,10,6,24,6,-6,24,6,-10,24,10],
// 4 16 -10 24 10 -6 24 6 -6 24 -6 -10 24 -10
  [4,16,-10,24,10,-6,24,6,-6,24,-6,-10,24,-10],
// 4 16 -10 24 -10 -6 24 -6 6 24 -6 10 24 -10
  [4,16,-10,24,-10,-6,24,-6,6,24,-6,10,24,-10],
// 1 16 0 24 0 10 0 0 0 -24 0 0 0 10 box4t.dat
  [1,16,0,24,0,10,0,0,0,-24,0,0,0,10, ldraw_lib__box4t(realsolid)],
// 1 16 0 0 0 0 0 1 0 1 0 -1 0 0 stud.dat
  [1,16,0,0,0,0,0,1,0,1,0,-1,0,0, ldraw_lib__stud(realsolid)],
// 0
];
module ldraw_lib__s__3005s01(step=0, col=false, unit=2/5, alt=false, line=0.2, solid=!$preview)
    makepoly(ldraw_lib__s__3005s01(solid), step=step, col=col, unit=unit, alt=alt, line=line, solid=solid);
ldraw_lib__s__3005s01(line=0.2);
// file: 3004.scad
use <../lib.scad>
use <s/3004s01.scad>
$fa=1; $fs=0.2;
function ldraw_lib__3004(realsolid=false) = [
// 0 Brick  1 x  2
// 0 Name: 3004.dat
// 0 Author: James Jessiman
// 0 !LDRAW_ORG Part UPDATE 2022-05
// 0 !LICENSE Licensed under CC BY 2.0 and CC BY 4.0 : see CAreadme.txt
// 
// 0 BFC CERTIFY CCW
  [0,"BFC","CERTIFY"],
  [0,"BFC","CCW"],
// 
// 0 !HISTORY 2001-10-26 [PTadmin] Official Update 2001-01
// 0 !HISTORY 2002-05-07 {unknown} BFC Certification
// 0 !HISTORY 2002-06-11 [PTadmin] Official Update 2002-03
// 0 !HISTORY 2007-05-07 [PTadmin] Header formatted for Contributor Agreement
// 0 !HISTORY 2008-07-01 [PTadmin] Official Update 2008-01
// 0 !HISTORY 2022-08-04 [MagFors] Using subfile
// 0 !HISTORY 2022-09-15 [PTadmin] Official Update 2022-05
// 
// 
// 1 16 0 0 0 1 0 0 0 1 0 0 0 1 s\3004s01.dat
  [1,16,0,0,0,1,0,0,0,1,0,0,0,1, ldraw_lib__s__3004s01(realsolid)],
// 4 16 -20 24 -10 20 24 -10 20 0 -10 -20 0 -10
  [4,16,-20,24,-10,20,24,-10,20,0,-10,-20,0,-10],
];
module ldraw_lib__3004(step=0, col=false, unit=2/5, alt=false, line=0.2, solid=!$preview)
    makepoly(ldraw_lib__3004(solid), step=step, col=col, unit=unit, alt=alt, line=line, solid=solid);
ldraw_lib__3004(line=0.2);
// file: 3005ptf.scad
use <../lib.scad>
use <s/3005s01.scad>
$fa=1; $fs=0.2;
function ldraw_lib__3005ptf(realsolid=false) = [
// 0 Brick  1 x  1 with Blue "F" Pattern
// 0 Name: 3005ptf.dat
// 0 Author: Tore Eriksson [Tore_Eriksson]
// 0 !LDRAW_ORG Part UPDATE 2014-02
// 0 !LICENSE Licensed under CC BY 2.0 and CC BY 4.0 : see CAreadme.txt
// 
// 0 BFC CERTIFY CCW
  [0,"BFC","CERTIFY"],
  [0,"BFC","CCW"],
// 
// 0 !HISTORY 2003-12-09 [Steffen] made use of existing subfile
// 0 !HISTORY 2004-04-22 [PTadmin] Official Update 2004-02
// 0 !HISTORY 2007-05-11 [PTadmin] Header formatted for Contributor Agreement
// 0 !HISTORY 2008-07-01 [PTadmin] Official Update 2008-01
// 0 !HISTORY 2014-12-18 [Holly-Wood] Fixed T-Junction, BFCed
// 0 !HISTORY 2014-12-23 [PTadmin] Official Update 2014-02
// 
// 
// 0 // Pattern
// 
// 4 1 5 7 -10 5 5 -10 -5 5 -10 -3 7 -10
  [4,1,5,7,-10,5,5,-10,-5,5,-10,-3,7,-10],
// 3 1 -5 5 -10 -3 11 -10 -3 7 -10
  [3,1,-5,5,-10,-3,11,-10,-3,7,-10],
// 4 1 -3 13 -10 -3 11 -10 -5 5 -10 -5 19 -10
  [4,1,-3,13,-10,-3,11,-10,-5,5,-10,-5,19,-10],
// 4 1 3 13 -10 3 11 -10 -3 11 -10 -3 13 -10
  [4,1,3,13,-10,3,11,-10,-3,11,-10,-3,13,-10],
// 3 1 -3 13 -10 -5 19 -10 -3 19 -10
  [3,1,-3,13,-10,-5,19,-10,-3,19,-10],
// 4 16 5 5 -10 10 0 -10 -10 0 -10 -5 5 -10
  [4,16,5,5,-10,10,0,-10,-10,0,-10,-5,5,-10],
// 4 16 -5 5 -10 -10 0 -10 -10 24 -10 -5 19 -10
  [4,16,-5,5,-10,-10,0,-10,-10,24,-10,-5,19,-10],
// 4 16 -5 19 -10 -10 24 -10 10 24 -10 -3 19 -10
  [4,16,-5,19,-10,-10,24,-10,10,24,-10,-3,19,-10],
// 4 16 -3 13 -10 -3 19 -10 10 24 -10 3 13 -10
  [4,16,-3,13,-10,-3,19,-10,10,24,-10,3,13,-10],
// 4 16 3 11 -10 3 13 -10 10 24 -10 5 7 -10
  [4,16,3,11,-10,3,13,-10,10,24,-10,5,7,-10],
// 4 16 -3 7 -10 -3 11 -10 3 11 -10 5 7 -10
  [4,16,-3,7,-10,-3,11,-10,3,11,-10,5,7,-10],
// 4 16 5 7 -10 10 24 -10 10 0 -10 5 5 -10
  [4,16,5,7,-10,10,24,-10,10,0,-10,5,5,-10],
// 
// 0 // Subfile
// 1 16 0 0 0 1 0 0 0 1 0 0 0 1 s\3005s01.dat
  [1,16,0,0,0,1,0,0,0,1,0,0,0,1, ldraw_lib__s__3005s01(realsolid)],
];
module ldraw_lib__3005ptf(step=0, col=false, unit=2/5, alt=false, line=0.2, solid=!$preview)
    makepoly(ldraw_lib__3005ptf(solid), step=step, col=col, unit=unit, alt=alt, line=line, solid=solid);
ldraw_lib__3005ptf(line=0.2);
// main file
use <../lib.scad>
use <3005ptf.scad>
$fa=1; $fs=0.2;
function ldraw_lib__3005_f(realsolid=false) = [
// 0 ~Moved to 3005ptf
// 0 Name: 3005-f.dat
// 0 Author: [PTadmin]
// 0 !LDRAW_ORG Part UPDATE 2004-02
// 0 !LICENSE Licensed under CC BY 4.0 : see CAreadme.txt
// 
// 0 BFC CERTIFY CCW
  [0,"BFC","CERTIFY"],
  [0,"BFC","CCW"],
// 
// 0 !HISTORY 1998-12-15 [PTadmin] Official Update 1998-10
// 0 !HISTORY 2004-04-22 [PTadmin] Official Update 2004-02
// 0 !HISTORY 2007-05-11 [PTadmin] Header formatted for Contributor Agreement
// 0 !HISTORY 2008-07-01 [PTadmin] Official Update 2008-01
// 
// 
// 1 16 0 0 0 1 0 0 0 1 0 0 0 1 3005ptf.dat
  [1,16,0,0,0,1,0,0,0,1,0,0,0,1, ldraw_lib__3005ptf(realsolid)],
];
module ldraw_lib__3005_f(step=0, col=false, unit=2/5, alt=false, line=0.2, solid=!$preview)
    makepoly(ldraw_lib__3005_f(solid), step=step, col=col, unit=unit, alt=alt, line=line, solid=solid);
ldraw_lib__3005_f(line=0.2);
